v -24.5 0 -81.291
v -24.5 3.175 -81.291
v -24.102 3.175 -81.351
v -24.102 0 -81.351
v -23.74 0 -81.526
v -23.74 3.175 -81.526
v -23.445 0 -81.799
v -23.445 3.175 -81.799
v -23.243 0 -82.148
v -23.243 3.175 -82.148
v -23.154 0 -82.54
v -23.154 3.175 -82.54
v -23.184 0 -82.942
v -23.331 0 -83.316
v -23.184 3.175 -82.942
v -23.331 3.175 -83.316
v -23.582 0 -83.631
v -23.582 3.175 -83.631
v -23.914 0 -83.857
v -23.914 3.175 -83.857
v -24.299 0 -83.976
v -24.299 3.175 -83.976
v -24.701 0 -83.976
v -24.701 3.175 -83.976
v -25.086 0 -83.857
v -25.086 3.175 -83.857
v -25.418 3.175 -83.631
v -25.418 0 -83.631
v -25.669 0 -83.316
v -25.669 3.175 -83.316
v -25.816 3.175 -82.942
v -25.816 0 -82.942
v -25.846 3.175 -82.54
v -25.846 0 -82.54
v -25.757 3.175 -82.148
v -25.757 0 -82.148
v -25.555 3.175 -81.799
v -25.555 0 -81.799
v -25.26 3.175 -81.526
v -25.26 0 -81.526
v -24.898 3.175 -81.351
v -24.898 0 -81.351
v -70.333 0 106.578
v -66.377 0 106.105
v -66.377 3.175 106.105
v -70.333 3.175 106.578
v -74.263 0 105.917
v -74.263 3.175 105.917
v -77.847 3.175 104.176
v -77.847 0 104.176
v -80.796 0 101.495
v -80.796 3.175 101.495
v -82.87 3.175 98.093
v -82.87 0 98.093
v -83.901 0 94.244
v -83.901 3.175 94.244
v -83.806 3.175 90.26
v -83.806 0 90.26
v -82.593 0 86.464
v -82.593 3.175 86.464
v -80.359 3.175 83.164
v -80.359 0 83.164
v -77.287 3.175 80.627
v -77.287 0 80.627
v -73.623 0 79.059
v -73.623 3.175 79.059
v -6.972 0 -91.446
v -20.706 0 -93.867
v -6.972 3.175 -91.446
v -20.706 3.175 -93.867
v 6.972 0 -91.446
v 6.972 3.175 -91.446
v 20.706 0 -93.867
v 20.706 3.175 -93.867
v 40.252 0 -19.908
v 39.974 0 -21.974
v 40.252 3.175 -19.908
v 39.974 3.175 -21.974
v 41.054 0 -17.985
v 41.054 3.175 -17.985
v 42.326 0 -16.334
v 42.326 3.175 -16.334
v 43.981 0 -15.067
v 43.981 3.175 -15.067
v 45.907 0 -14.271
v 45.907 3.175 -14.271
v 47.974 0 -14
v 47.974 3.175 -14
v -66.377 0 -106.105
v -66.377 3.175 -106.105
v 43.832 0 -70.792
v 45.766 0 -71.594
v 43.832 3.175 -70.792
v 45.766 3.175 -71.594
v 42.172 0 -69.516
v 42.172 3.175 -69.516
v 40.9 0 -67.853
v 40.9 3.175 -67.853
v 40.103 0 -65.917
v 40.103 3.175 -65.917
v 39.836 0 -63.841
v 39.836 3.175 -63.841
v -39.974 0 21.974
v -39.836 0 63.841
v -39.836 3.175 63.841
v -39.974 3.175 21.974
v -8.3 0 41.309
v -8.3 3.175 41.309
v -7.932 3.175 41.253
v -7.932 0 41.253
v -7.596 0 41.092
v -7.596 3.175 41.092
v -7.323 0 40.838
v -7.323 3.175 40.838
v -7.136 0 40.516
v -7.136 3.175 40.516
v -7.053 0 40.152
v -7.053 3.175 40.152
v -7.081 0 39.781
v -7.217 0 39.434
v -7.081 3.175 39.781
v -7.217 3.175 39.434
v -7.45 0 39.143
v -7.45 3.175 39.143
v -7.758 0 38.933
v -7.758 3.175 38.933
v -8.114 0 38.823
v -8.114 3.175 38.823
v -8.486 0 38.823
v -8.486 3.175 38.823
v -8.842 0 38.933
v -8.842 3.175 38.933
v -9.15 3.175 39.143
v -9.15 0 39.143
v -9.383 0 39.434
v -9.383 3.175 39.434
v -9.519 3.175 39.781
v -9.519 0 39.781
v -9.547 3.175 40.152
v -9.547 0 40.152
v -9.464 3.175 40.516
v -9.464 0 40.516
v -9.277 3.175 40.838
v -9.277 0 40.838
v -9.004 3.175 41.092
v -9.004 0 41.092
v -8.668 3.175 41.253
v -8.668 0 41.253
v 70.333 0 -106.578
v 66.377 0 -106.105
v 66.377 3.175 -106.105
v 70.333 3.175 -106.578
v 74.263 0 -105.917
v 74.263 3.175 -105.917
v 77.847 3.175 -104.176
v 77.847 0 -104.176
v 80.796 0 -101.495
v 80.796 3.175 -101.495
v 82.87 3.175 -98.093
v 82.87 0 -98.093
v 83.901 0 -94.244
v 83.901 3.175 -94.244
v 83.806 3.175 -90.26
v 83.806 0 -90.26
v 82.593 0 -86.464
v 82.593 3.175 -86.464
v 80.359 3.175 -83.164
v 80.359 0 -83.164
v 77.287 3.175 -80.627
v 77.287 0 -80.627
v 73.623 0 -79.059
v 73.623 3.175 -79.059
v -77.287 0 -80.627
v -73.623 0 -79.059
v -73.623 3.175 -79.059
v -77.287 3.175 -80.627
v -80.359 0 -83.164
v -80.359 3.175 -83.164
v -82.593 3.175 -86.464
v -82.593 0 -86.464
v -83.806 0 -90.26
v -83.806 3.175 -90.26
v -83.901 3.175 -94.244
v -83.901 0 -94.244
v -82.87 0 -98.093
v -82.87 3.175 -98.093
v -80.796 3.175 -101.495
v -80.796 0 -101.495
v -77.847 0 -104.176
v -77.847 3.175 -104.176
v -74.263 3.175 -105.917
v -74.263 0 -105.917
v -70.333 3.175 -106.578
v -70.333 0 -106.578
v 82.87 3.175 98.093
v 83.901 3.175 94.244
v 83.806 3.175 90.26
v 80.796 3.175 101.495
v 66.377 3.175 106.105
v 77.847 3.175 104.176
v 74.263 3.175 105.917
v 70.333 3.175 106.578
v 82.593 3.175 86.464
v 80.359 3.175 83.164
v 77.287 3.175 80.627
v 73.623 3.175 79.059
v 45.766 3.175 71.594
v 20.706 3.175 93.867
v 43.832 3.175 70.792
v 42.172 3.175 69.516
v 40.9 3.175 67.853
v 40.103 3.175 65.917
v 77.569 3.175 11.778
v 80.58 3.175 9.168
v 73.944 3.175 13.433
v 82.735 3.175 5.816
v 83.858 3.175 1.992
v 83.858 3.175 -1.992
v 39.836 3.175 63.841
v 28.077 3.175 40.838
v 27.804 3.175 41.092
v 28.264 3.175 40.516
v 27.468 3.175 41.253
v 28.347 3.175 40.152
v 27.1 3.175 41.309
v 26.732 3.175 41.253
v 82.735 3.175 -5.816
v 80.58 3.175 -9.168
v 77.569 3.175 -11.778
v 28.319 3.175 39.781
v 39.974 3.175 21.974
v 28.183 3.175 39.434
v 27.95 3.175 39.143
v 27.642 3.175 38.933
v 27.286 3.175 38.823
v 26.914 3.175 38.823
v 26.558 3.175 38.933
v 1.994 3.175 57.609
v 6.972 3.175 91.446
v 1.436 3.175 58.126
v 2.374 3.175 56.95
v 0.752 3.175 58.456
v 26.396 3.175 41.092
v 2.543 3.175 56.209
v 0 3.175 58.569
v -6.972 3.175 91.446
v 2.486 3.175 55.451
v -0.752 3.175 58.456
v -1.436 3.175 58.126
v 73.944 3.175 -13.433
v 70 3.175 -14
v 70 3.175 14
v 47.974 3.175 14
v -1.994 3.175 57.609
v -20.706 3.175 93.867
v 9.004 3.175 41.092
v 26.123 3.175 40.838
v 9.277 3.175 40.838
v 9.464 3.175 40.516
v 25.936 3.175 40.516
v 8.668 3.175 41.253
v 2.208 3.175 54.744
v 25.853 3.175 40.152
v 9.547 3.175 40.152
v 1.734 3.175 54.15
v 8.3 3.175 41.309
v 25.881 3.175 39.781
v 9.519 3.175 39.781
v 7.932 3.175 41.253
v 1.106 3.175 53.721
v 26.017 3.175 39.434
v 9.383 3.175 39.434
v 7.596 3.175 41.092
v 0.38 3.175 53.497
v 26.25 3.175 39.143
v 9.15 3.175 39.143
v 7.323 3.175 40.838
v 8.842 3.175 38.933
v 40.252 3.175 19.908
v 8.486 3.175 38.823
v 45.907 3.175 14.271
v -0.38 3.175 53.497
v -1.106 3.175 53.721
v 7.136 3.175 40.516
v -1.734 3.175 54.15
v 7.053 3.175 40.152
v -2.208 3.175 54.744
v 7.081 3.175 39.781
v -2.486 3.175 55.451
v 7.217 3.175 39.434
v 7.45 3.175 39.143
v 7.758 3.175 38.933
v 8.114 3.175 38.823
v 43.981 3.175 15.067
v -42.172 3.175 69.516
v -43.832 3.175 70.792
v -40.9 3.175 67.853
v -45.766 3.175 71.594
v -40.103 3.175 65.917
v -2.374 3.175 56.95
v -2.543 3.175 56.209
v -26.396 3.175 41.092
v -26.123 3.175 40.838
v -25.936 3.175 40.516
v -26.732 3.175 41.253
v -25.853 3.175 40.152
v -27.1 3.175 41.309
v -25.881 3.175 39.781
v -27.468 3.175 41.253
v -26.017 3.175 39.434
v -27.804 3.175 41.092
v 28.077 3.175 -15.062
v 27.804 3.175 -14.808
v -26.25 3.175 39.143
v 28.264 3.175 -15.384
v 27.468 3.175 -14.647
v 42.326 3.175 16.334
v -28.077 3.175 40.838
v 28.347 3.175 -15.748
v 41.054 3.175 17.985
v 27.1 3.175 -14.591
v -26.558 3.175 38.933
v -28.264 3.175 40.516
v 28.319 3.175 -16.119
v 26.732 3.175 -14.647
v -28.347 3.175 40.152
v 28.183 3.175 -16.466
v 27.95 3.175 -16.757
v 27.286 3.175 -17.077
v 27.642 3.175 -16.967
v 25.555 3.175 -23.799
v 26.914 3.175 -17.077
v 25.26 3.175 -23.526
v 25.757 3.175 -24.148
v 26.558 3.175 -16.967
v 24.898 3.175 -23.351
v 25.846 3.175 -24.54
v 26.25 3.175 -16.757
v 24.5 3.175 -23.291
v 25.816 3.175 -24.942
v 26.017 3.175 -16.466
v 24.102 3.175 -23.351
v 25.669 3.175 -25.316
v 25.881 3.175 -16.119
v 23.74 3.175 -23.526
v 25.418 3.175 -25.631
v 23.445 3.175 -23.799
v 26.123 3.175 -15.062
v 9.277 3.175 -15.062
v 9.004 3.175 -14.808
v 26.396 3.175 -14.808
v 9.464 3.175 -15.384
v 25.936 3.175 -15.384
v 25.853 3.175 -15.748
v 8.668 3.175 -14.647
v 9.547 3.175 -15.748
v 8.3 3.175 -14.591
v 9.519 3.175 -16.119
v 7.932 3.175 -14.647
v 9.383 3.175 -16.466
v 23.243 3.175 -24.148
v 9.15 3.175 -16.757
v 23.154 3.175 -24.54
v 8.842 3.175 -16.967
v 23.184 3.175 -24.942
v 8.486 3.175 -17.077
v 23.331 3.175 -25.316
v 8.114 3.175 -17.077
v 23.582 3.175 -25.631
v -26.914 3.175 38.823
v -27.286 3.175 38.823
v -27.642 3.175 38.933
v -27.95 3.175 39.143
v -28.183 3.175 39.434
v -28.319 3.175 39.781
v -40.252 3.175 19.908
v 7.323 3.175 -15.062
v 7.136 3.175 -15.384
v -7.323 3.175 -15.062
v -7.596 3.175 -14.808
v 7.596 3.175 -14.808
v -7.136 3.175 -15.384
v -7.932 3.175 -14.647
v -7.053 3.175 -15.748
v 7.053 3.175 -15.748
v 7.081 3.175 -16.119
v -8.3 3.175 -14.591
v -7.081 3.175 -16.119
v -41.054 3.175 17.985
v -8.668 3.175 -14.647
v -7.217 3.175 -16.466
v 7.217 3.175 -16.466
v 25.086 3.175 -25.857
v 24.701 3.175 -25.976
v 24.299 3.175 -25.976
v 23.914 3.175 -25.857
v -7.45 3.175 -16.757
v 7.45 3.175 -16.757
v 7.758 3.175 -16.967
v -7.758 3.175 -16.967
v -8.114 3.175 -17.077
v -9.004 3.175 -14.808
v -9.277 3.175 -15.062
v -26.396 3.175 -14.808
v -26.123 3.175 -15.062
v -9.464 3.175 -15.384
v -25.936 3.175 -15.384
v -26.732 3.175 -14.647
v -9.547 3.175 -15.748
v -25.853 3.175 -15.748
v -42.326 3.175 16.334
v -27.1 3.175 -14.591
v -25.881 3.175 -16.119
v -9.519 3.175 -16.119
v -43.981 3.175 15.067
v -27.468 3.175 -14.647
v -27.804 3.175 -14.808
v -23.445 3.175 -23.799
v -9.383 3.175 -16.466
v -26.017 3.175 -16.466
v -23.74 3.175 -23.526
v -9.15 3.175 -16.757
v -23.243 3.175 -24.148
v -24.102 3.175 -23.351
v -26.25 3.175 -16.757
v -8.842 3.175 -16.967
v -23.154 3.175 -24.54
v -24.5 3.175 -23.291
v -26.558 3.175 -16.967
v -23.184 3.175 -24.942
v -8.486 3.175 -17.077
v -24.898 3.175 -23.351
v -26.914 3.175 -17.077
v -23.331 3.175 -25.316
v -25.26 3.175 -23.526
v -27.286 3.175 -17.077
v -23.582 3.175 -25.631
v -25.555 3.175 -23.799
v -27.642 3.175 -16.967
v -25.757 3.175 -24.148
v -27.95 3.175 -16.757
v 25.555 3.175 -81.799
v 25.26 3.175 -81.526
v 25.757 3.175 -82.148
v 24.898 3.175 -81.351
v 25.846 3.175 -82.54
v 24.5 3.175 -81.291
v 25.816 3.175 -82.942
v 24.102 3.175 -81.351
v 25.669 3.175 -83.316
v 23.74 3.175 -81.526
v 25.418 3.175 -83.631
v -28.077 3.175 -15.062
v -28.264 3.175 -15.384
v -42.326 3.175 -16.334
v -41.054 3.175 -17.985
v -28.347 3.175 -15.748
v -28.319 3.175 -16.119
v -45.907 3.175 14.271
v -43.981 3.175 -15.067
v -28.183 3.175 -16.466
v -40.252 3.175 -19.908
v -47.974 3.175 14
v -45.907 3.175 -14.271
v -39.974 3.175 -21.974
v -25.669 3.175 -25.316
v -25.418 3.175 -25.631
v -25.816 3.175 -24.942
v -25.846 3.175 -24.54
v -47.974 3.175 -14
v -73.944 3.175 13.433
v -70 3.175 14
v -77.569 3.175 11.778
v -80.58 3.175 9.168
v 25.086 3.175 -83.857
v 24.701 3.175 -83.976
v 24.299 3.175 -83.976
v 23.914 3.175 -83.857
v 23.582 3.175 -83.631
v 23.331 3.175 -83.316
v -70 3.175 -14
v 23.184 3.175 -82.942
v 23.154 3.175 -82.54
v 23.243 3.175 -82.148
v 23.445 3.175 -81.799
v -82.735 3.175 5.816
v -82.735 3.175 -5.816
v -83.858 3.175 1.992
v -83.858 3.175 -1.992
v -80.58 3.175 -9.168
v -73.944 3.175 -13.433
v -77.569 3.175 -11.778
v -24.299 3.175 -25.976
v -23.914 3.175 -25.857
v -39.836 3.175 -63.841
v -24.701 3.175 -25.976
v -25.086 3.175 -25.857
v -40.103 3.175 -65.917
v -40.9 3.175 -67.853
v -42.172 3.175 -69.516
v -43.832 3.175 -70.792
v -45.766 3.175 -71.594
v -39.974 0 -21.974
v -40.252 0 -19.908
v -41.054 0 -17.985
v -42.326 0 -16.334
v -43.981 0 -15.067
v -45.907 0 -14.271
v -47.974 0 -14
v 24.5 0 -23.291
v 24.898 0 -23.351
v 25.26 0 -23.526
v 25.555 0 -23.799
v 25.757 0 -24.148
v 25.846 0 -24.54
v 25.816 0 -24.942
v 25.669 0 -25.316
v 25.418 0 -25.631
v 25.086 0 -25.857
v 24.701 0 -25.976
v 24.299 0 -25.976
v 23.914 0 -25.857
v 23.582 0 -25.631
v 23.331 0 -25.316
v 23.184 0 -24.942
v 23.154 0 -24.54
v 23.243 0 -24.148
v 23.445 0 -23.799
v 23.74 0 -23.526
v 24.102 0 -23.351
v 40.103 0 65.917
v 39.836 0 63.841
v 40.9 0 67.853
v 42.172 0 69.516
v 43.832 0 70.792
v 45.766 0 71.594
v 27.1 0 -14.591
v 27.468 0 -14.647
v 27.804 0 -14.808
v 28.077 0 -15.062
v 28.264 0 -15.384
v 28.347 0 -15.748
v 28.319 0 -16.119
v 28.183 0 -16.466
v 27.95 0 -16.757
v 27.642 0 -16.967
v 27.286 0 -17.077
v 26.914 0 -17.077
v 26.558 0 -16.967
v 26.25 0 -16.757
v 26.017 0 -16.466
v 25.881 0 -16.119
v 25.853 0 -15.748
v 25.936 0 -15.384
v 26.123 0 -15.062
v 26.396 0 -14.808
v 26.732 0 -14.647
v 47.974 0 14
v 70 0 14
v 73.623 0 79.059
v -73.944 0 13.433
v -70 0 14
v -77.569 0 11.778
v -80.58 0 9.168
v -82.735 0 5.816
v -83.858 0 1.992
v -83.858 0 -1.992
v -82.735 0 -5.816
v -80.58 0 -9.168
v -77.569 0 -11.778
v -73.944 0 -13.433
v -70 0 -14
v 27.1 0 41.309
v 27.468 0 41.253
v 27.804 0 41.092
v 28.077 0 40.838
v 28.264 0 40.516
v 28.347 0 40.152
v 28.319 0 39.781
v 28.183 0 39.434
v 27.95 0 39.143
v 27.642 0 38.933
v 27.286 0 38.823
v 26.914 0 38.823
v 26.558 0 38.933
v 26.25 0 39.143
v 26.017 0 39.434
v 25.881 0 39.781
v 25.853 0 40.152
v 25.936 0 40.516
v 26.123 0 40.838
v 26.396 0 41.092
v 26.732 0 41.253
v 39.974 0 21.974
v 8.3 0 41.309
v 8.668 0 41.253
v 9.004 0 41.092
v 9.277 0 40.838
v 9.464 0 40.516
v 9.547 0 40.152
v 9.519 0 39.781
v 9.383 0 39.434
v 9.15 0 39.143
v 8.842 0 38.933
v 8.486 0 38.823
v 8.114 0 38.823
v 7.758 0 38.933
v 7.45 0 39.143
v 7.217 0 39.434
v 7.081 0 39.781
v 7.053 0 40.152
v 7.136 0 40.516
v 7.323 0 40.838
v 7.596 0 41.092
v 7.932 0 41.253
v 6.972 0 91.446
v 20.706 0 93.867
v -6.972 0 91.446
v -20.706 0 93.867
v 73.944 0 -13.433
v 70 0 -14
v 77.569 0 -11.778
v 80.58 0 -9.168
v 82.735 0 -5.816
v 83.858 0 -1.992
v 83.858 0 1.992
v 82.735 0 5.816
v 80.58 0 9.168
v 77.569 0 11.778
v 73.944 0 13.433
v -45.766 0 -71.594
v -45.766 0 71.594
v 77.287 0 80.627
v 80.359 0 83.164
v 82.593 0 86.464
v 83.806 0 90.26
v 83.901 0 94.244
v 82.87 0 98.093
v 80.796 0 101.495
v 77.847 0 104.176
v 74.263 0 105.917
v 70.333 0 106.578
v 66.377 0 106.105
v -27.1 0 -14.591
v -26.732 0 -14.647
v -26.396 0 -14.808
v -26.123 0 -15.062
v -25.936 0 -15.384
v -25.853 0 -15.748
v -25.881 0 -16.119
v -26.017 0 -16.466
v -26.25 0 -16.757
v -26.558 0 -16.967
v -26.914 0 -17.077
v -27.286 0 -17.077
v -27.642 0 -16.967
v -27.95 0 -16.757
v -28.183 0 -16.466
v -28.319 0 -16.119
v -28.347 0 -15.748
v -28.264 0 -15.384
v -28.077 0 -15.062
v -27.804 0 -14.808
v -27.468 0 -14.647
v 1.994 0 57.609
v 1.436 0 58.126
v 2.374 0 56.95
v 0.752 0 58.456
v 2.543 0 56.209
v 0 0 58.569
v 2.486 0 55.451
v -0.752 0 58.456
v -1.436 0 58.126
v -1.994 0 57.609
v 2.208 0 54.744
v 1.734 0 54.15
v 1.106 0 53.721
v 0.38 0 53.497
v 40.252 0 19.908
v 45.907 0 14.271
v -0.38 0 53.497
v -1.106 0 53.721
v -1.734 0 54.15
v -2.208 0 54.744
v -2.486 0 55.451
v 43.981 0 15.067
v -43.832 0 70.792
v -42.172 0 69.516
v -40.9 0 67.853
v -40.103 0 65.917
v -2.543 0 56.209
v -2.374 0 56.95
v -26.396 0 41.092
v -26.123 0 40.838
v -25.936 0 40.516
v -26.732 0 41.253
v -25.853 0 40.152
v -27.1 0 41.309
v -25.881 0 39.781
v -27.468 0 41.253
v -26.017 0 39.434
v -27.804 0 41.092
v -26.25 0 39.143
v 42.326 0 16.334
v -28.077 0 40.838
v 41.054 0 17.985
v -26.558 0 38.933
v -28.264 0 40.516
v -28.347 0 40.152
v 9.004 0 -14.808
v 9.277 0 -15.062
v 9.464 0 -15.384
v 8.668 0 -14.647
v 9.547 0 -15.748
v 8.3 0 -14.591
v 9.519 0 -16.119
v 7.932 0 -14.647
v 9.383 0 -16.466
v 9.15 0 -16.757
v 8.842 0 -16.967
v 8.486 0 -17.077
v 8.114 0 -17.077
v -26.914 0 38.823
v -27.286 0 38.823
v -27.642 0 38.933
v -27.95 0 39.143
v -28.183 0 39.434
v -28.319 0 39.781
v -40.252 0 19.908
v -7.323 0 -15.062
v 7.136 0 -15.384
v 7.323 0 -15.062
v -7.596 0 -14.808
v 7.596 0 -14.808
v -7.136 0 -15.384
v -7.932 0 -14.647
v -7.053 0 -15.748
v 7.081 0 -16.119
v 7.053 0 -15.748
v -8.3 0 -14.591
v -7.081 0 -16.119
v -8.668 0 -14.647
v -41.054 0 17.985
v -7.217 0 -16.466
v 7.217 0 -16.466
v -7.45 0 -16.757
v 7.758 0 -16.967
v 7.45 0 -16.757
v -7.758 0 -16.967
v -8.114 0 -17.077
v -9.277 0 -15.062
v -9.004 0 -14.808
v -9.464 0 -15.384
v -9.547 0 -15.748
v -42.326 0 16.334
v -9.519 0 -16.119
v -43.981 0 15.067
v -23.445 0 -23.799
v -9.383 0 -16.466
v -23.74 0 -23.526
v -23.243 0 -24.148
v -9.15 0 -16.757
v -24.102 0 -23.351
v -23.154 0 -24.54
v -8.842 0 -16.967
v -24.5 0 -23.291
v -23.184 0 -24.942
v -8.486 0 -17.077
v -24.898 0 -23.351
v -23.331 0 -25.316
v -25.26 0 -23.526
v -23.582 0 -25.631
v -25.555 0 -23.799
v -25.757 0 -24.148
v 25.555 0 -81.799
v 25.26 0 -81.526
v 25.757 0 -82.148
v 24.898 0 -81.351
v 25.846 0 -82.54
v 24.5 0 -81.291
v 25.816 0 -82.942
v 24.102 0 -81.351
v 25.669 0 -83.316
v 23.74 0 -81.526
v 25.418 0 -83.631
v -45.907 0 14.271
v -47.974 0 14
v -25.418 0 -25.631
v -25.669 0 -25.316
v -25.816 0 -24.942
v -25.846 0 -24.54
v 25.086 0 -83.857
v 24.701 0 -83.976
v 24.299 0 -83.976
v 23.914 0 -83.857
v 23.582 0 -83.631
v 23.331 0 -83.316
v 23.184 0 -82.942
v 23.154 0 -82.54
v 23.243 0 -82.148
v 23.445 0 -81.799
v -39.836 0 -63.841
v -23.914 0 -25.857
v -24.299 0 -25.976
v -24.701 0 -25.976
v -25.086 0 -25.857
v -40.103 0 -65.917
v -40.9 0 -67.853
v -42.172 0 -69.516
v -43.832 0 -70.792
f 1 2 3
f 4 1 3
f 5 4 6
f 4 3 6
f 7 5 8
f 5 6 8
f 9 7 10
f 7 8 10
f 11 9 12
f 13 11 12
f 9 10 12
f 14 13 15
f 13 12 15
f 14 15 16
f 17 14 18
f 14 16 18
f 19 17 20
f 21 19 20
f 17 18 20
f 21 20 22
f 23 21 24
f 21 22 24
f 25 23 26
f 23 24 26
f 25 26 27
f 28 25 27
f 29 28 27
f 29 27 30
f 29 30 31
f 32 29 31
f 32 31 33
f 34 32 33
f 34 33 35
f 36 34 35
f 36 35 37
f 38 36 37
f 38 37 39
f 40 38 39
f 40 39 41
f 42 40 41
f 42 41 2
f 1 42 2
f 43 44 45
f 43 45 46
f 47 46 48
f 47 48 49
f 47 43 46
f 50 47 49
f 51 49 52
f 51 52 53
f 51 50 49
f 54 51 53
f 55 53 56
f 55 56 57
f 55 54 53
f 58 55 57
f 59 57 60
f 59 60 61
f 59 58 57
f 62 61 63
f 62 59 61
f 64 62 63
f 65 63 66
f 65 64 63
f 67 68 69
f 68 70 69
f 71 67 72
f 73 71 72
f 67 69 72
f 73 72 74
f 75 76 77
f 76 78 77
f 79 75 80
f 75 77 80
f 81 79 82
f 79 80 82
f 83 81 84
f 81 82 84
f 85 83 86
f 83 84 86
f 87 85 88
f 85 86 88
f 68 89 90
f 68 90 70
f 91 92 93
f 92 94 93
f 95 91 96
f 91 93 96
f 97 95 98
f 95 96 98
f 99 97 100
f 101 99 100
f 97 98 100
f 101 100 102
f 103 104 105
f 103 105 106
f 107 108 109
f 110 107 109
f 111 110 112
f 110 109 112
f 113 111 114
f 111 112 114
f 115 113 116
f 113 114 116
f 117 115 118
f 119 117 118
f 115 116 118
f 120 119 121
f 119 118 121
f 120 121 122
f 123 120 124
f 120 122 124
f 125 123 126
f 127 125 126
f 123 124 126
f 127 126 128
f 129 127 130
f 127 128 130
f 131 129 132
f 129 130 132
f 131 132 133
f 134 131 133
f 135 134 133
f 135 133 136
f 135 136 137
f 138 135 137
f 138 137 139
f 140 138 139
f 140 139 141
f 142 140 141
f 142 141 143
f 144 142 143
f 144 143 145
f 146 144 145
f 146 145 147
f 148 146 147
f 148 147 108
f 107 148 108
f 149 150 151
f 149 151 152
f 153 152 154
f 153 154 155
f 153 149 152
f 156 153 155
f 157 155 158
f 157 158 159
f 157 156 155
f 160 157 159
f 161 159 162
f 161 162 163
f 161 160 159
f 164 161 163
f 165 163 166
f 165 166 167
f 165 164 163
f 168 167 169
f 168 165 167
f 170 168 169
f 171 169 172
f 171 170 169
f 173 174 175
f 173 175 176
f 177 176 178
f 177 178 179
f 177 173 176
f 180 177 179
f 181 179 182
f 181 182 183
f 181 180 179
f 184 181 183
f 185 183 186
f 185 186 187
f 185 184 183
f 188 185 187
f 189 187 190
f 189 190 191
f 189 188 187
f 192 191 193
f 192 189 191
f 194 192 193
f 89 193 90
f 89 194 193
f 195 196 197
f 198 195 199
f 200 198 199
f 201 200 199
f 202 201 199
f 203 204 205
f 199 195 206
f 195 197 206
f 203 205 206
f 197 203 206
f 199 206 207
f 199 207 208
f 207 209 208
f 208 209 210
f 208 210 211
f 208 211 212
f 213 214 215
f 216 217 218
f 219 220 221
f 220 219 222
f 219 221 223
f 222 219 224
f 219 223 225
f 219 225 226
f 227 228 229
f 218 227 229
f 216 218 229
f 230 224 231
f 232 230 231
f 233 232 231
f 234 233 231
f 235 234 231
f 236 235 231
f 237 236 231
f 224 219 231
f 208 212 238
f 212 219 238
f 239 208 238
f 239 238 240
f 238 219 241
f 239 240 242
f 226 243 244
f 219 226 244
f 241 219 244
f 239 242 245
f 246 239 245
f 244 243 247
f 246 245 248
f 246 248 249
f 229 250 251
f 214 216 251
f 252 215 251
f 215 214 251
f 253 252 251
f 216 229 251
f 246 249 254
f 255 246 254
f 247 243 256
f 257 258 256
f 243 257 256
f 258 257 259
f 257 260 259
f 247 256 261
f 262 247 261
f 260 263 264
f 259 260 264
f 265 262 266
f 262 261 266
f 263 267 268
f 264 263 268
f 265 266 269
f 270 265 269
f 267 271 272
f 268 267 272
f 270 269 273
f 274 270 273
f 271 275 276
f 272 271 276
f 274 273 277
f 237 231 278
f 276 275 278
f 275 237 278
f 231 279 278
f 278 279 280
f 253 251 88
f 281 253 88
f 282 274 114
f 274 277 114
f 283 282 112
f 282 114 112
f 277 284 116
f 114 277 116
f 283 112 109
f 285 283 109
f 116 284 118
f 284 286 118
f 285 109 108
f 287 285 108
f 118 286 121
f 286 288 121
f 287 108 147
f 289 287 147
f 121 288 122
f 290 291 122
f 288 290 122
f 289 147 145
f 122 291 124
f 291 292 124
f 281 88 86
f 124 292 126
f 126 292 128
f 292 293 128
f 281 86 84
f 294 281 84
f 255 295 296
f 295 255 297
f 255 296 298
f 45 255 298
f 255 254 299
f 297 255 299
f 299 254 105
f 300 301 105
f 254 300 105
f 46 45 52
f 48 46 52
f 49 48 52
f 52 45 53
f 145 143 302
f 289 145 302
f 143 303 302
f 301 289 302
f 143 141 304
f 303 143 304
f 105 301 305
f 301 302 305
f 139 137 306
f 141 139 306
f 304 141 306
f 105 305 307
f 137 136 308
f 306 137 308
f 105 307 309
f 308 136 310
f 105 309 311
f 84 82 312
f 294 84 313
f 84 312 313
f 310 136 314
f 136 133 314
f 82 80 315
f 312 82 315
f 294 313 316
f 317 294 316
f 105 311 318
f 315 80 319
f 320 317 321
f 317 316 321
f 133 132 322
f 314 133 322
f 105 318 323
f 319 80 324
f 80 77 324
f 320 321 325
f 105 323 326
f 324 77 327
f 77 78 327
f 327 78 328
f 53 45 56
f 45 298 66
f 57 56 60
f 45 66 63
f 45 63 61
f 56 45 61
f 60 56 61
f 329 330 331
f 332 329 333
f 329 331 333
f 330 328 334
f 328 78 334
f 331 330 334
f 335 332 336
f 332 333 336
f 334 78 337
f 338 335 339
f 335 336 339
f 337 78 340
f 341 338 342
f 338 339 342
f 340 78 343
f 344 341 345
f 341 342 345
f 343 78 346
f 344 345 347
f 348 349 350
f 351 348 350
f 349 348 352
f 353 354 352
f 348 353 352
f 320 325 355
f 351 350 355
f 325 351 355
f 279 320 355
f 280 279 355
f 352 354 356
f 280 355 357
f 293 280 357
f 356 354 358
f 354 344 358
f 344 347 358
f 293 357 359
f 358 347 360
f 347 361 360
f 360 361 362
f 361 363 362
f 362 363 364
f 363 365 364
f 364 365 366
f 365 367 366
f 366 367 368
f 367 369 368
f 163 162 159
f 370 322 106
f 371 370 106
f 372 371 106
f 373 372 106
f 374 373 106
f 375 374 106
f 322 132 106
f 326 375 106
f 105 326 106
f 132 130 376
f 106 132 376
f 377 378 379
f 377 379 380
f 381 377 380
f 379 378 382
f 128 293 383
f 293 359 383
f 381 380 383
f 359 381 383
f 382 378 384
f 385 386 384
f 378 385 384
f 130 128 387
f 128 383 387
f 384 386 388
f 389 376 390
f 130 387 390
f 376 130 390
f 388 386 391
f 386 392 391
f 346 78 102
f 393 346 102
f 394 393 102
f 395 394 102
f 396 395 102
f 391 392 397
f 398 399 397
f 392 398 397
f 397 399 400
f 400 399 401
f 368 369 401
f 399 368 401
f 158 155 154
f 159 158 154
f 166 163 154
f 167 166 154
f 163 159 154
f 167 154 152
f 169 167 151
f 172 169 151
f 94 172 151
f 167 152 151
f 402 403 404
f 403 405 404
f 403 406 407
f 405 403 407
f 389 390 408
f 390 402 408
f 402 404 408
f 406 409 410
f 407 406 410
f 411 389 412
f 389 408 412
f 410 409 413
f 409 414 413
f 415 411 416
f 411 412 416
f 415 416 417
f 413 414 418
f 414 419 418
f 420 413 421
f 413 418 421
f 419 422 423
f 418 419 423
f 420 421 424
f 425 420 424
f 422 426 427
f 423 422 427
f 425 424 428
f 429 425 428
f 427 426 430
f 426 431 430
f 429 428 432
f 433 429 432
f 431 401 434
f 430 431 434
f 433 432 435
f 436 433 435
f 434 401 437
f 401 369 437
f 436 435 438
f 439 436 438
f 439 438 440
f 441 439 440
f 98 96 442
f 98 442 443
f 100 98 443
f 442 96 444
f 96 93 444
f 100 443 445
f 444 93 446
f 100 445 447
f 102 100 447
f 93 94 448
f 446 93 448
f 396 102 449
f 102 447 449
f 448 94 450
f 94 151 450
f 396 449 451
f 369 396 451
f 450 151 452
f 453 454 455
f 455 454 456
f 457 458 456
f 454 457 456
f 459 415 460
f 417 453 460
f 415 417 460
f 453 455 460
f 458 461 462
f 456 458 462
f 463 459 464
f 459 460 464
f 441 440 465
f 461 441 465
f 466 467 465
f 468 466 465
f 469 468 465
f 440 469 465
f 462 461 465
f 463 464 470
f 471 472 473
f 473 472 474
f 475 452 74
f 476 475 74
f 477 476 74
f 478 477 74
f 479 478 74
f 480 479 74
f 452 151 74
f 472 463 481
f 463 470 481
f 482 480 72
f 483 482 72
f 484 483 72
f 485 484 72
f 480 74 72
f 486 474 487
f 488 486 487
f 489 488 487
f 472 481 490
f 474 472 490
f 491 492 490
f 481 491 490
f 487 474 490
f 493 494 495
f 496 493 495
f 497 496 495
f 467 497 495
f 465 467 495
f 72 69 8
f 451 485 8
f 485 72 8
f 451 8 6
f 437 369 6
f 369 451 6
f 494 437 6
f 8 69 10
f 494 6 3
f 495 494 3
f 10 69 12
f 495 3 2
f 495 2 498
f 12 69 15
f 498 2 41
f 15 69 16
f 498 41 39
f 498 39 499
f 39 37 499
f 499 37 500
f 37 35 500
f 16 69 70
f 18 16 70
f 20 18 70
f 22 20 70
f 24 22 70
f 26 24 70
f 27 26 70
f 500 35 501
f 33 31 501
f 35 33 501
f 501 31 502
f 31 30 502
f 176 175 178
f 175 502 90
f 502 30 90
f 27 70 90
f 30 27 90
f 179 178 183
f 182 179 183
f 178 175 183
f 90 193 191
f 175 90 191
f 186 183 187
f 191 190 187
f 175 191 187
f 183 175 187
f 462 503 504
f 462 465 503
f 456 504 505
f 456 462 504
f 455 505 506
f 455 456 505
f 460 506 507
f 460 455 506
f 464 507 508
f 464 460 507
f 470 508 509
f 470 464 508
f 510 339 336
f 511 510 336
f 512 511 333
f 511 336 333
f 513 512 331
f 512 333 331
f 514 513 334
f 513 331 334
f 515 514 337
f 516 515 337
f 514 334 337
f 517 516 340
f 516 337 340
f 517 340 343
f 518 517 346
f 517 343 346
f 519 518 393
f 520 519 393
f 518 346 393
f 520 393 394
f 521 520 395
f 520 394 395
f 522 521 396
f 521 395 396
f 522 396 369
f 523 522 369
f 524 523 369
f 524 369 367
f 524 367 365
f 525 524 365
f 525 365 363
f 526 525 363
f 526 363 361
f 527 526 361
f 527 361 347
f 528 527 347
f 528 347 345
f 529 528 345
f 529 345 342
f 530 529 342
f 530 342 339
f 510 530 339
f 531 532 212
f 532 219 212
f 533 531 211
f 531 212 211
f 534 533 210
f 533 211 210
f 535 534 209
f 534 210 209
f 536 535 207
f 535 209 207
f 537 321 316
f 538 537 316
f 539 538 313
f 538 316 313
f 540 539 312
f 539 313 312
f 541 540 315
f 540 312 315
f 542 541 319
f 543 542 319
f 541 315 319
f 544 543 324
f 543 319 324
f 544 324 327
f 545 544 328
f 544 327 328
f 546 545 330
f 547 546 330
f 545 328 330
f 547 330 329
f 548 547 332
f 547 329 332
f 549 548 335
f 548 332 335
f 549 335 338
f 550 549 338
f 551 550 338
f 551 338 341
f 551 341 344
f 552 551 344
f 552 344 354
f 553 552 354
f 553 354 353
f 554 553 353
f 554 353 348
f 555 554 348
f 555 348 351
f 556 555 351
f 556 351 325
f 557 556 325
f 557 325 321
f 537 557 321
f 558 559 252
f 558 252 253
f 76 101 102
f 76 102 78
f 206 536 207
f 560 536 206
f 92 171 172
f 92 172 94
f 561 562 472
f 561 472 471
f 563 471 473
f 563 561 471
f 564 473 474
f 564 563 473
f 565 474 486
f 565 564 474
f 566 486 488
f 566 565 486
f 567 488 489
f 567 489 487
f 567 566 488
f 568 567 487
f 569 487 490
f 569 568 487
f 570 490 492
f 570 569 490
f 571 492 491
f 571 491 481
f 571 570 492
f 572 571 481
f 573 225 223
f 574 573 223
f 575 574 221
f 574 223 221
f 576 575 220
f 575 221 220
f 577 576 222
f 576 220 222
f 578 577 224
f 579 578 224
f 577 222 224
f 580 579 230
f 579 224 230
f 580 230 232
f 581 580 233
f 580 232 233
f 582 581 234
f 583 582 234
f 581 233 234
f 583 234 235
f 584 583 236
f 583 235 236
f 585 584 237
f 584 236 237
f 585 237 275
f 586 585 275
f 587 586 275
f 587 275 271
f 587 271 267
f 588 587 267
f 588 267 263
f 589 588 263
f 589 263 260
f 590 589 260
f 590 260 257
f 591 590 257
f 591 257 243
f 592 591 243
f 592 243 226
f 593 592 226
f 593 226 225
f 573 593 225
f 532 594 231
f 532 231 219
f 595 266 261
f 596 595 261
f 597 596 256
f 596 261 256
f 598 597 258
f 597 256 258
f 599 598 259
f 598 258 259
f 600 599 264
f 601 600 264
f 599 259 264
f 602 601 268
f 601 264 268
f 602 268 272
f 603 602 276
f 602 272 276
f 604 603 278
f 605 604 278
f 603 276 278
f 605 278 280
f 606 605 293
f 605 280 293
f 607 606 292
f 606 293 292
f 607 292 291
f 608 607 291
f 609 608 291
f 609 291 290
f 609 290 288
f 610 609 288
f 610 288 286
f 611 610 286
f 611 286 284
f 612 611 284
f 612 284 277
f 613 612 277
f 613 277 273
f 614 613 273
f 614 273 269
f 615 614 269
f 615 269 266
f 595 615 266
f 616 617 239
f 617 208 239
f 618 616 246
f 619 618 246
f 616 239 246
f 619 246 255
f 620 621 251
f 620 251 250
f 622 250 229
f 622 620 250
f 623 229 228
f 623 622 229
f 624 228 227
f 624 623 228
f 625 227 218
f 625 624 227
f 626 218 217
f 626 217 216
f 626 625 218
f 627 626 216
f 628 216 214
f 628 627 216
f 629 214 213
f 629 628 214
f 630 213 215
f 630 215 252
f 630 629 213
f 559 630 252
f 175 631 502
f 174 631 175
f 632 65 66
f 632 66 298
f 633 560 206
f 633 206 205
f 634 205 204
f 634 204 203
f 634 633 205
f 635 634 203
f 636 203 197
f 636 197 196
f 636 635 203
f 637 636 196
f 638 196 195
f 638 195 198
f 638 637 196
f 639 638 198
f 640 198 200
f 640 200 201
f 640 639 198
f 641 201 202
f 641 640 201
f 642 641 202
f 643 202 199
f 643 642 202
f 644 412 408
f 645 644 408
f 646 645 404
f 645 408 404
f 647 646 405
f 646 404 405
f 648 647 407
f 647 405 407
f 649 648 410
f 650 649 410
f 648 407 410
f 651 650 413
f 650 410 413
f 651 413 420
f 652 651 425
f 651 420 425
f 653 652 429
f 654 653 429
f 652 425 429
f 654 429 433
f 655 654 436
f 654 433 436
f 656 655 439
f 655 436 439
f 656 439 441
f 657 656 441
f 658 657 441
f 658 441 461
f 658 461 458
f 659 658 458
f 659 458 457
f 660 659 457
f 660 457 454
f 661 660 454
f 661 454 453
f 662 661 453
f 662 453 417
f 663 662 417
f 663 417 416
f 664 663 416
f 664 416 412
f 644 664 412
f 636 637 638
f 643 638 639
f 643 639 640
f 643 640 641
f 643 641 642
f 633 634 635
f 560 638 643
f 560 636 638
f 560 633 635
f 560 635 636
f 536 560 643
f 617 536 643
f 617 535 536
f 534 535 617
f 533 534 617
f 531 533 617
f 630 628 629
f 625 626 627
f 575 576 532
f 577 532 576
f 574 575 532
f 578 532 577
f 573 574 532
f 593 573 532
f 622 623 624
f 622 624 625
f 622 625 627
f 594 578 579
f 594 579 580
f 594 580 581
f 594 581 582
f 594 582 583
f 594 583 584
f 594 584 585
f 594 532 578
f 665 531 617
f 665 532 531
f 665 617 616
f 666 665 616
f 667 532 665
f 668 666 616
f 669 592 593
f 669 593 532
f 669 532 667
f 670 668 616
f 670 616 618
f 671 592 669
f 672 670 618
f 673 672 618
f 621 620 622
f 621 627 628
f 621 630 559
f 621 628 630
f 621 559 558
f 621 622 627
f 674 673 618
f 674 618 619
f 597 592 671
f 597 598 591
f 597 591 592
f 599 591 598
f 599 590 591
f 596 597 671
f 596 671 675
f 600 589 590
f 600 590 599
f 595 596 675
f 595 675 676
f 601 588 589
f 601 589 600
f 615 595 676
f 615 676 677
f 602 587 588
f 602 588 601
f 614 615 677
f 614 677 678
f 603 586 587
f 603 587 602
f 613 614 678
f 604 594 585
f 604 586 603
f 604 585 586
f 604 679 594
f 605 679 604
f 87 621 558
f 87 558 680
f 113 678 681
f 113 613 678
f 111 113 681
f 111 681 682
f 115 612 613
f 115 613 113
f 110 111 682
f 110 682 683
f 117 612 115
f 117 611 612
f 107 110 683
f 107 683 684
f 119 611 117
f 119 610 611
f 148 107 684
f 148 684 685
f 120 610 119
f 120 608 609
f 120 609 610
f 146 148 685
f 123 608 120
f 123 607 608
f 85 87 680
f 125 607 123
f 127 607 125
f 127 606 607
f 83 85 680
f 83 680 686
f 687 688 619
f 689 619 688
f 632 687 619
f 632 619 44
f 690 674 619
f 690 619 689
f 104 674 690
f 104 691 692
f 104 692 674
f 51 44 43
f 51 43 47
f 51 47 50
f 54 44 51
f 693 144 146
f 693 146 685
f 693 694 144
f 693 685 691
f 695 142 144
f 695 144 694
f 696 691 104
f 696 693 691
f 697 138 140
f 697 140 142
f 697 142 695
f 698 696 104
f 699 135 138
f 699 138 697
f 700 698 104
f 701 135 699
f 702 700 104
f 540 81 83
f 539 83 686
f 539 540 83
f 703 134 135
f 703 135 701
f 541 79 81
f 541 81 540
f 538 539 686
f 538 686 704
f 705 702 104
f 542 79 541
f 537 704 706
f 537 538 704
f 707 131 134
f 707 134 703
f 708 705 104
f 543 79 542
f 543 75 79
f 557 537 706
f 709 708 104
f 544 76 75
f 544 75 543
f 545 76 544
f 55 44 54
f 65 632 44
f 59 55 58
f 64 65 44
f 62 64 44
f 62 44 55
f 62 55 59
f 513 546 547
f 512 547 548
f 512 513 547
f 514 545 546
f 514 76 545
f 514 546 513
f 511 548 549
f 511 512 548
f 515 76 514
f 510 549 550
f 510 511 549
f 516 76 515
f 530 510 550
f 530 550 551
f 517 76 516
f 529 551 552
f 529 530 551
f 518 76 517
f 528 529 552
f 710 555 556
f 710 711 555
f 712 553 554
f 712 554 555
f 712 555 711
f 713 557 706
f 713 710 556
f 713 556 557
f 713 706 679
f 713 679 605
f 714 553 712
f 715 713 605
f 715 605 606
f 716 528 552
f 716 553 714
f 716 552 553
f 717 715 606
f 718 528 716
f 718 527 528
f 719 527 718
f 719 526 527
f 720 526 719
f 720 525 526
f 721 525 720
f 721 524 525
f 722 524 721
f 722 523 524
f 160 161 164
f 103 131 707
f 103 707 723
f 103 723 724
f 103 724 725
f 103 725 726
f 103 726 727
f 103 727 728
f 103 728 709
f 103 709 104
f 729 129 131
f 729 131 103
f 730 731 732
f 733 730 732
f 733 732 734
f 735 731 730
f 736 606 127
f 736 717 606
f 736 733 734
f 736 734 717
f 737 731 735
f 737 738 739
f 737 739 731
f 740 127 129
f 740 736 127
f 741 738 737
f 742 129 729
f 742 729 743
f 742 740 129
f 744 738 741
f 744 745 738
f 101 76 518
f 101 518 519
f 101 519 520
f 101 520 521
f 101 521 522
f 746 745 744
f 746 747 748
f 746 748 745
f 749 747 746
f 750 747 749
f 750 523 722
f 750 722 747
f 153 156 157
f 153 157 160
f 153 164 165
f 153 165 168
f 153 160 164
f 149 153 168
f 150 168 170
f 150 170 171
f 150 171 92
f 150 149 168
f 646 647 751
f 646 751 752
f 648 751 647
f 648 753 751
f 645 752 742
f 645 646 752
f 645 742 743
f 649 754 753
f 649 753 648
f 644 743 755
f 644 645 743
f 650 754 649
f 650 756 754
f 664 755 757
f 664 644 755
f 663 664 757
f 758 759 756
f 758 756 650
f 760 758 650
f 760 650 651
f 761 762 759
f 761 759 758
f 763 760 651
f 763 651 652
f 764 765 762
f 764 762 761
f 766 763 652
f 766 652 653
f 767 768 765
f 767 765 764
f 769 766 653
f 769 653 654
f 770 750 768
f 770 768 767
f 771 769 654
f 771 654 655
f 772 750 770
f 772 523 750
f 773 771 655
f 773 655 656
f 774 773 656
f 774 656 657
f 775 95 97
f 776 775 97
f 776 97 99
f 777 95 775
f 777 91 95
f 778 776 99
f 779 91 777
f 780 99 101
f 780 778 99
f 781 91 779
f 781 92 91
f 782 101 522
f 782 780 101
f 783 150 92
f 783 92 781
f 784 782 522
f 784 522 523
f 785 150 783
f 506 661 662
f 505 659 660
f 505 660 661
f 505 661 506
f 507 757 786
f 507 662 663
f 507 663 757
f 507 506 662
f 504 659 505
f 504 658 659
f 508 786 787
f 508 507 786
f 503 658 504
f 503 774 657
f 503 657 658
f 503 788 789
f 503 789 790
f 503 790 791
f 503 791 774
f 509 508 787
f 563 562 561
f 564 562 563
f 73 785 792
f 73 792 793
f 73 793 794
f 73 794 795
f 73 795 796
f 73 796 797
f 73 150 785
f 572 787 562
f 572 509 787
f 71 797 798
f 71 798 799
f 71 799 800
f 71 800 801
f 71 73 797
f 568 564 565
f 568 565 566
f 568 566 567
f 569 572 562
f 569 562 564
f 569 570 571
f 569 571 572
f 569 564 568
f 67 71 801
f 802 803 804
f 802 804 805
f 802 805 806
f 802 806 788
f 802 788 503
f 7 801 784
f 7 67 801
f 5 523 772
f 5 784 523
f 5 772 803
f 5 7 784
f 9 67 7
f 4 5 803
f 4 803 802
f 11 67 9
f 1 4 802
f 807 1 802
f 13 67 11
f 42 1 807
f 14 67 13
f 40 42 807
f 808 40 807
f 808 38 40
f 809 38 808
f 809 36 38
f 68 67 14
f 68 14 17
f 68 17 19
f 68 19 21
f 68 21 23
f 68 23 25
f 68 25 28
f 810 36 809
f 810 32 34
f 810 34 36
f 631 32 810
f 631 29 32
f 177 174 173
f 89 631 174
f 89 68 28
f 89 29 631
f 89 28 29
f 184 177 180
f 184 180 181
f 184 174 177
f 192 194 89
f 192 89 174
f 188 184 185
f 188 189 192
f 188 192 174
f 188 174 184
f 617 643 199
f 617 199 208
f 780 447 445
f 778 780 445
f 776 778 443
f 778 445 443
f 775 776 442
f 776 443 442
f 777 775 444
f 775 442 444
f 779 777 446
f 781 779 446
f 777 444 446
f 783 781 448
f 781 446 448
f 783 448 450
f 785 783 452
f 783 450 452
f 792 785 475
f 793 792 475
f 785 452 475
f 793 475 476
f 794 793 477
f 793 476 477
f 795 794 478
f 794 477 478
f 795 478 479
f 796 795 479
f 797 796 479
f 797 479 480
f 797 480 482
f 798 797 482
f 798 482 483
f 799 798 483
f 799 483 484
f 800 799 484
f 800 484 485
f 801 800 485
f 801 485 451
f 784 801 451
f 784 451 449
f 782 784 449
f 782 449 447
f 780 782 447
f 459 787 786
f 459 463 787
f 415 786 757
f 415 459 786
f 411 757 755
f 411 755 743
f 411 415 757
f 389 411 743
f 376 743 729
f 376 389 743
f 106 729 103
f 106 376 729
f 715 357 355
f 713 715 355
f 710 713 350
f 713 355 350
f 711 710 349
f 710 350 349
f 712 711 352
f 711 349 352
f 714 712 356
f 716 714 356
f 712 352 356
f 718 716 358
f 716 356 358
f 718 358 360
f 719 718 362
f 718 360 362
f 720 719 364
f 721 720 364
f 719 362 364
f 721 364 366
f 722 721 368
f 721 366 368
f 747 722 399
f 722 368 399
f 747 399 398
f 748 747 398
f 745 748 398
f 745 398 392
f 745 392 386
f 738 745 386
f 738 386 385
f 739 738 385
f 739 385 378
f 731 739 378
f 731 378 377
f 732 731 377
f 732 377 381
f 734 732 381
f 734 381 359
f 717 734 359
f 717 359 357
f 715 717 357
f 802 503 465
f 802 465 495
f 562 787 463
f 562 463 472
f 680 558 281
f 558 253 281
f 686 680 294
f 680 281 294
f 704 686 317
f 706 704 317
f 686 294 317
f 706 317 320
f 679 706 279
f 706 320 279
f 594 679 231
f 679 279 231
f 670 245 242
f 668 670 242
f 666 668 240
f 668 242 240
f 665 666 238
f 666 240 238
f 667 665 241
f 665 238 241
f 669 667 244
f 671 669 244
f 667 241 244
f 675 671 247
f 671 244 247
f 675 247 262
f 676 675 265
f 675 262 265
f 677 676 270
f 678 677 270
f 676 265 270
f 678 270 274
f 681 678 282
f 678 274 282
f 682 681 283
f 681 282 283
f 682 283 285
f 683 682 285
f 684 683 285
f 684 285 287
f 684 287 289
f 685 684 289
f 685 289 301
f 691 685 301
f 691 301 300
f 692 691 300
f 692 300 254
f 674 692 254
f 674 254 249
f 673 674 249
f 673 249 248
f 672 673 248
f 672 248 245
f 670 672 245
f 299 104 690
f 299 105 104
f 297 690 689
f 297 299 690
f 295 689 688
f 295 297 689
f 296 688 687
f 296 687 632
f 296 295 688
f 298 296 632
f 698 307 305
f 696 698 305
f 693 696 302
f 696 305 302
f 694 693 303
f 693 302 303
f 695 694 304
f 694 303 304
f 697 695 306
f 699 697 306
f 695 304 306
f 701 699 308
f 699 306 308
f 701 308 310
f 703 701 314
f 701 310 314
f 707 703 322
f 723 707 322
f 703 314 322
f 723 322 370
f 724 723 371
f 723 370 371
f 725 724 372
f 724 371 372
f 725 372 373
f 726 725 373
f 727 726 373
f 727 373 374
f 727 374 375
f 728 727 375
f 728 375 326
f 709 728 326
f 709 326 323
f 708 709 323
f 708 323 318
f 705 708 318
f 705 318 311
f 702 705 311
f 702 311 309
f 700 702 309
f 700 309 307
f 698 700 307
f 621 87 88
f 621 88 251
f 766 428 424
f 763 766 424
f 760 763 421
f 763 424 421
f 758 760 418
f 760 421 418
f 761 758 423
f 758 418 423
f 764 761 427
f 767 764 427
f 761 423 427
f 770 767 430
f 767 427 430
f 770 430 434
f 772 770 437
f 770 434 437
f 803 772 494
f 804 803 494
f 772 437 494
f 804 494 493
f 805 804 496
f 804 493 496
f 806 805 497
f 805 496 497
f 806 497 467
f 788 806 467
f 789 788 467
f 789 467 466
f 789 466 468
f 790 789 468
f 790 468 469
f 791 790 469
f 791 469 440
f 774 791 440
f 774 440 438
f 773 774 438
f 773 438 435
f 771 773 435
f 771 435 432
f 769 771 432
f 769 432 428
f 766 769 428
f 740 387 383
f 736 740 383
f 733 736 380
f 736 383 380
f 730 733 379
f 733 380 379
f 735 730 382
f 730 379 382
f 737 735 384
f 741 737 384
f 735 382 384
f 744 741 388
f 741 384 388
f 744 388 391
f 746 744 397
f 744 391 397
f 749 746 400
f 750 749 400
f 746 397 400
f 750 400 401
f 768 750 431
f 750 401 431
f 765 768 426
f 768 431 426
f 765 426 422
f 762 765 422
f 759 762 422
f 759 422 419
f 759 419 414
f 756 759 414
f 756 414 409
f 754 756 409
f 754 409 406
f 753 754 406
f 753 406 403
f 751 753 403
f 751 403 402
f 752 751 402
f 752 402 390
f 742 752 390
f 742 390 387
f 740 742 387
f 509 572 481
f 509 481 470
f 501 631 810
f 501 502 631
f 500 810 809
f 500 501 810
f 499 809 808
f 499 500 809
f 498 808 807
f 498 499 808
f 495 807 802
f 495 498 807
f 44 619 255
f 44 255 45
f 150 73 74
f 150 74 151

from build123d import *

# Parameters (mm, degrees)
BOSS_EXTRUDE1_DEPTH = 3.175
FILLET1_R           = 80
FILLET2_R           = 8
SKETCH2_R           = 1.35
CUT_EXTRUDE1_DEPTH  = 136.741386774
SKETCH3_R           = 1.25
CUT_EXTRUDE2_DEPTH  = 136.741386774
SKETCH5_R           = 2.55
CUT_EXTRUDE3_DEPTH  = 136.741386774


with BuildPart() as part:
    # Sketch1 → Boss-Extrude1 (new body)
    with BuildSketch(Plane(origin=(0, 0, 0), x_dir=(1, 0, 0), z_dir=(0, 1, 0))):
        with BuildLine():
            Line((-70, 14), (-40, 14))
            Line((-40, 14), (-39.816062711, 70))
            Line((-39.816062711, 70), (-73.623466631, 79.058666579))
            ThreePointArc((-73.623466631, 79.058666579), (-83.522961568, 96.205094778), (-66.376533369, 106.104589715))
            Line((-66.376533369, 106.104589715), (0, 88.319051202))
            Line((0, 88.319051202), (66.376533369, 106.104589715))
            ThreePointArc((66.376533369, 106.104589715), (83.522961568, 96.205094778), (73.623466631, 79.058666579))
            Line((73.623466631, 79.058666579), (39.816062711, 70))
            Line((39.816062711, 70), (40, 14))
            Line((40, 14), (70, 14))
            ThreePointArc((70, 14), (84, 0), (70, -14))
            Line((70, -14), (40, -14))
            Line((40, -14), (39.816062711, -70))
            Line((39.816062711, -70), (73.623466631, -79.058666579))
            ThreePointArc((73.623466631, -79.058666579), (83.522961568, -96.205094778), (66.376533369, -106.104589715))
            Line((66.376533369, -106.104589715), (0, -88.319051202))
            Line((0, -88.319051202), (-66.376533369, -106.104589715))
            ThreePointArc((-66.376533369, -106.104589715), (-83.522961568, -96.205094778), (-73.623466631, -79.058666579))
            Line((-73.623466631, -79.058666579), (-39.816062711, -70))
            Line((-39.816062711, -70), (-40, -14))
            Line((-40, -14), (-70, -14))
            ThreePointArc((-70, -14), (-84, 0), (-70, 14))
        make_face()
    extrude(amount=BOSS_EXTRUDE1_DEPTH)

    # Fillet1
    fillet1_edges = [part.edges().sort_by_distance(p)[0] for p in [
        (0, 1.5875, -88.319051202),
        (0, 1.5875, 88.319051202),
    ]]
    fillet(fillet1_edges, radius=FILLET1_R)

    # Fillet2
    fillet2_edges = [part.edges().sort_by_distance(p)[0] for p in [
        (-40, 1.5875, -14),
        (-39.816062711, 1.5875, -70),
        (39.816062711, 1.5875, -70),
        (40, 1.5875, -14),
        (40, 1.5875, 14),
        (39.816062711, 1.5875, 70),
        (-39.816062711, 1.5875, 70),
        (-40, 1.5875, 14),
    ]]
    fillet(fillet2_edges, radius=FILLET2_R)

    # Sketch2 → Cut-Extrude1 (cut, through all)
    with BuildSketch(Plane(origin=(0, 3.175, 0), x_dir=(1, 0, 0), z_dir=(0, 1, 0))):
        with Locations(Location((-24.5, 24.641145635, 0), (0, 0, 270))):
            Circle(SKETCH2_R)
        with Locations(Location((24.5, 24.641145635, 0), (0, 0, 270))):
            Circle(SKETCH2_R)
        with Locations(Location((24.5, 82.641145635, 0), (0, 0, 270))):
            Circle(SKETCH2_R)
        with Locations(Location((-24.5, 82.641145635, 0), (0, 0, 270))):
            Circle(SKETCH2_R)
    extrude(amount=-CUT_EXTRUDE1_DEPTH, mode=Mode.SUBTRACT)

    # Sketch3 → Cut-Extrude2 (cut, through all)
    with BuildSketch(Plane(origin=(0, 3.175, 0), x_dir=(1, 0, 0), z_dir=(0, 1, 0))):
        with Locations(Location((-8.3, -40.058854365, 0), (0, 0, 270))):
            Circle(SKETCH3_R)
        with Locations(Location((-27.1, -40.058854365, 0), (0, 0, 270))):
            Circle(SKETCH3_R)
        with Locations(Location((-27.1, 15.841145635, 0), (0, 0, 270))):
            Circle(SKETCH3_R)
        with Locations(Location((-8.3, 15.841145635, 0), (0, 0, 270))):
            Circle(SKETCH3_R)
        with Locations(Location((8.3, 15.841145635, 0), (0, 0, 270))):
            Circle(SKETCH3_R)
        with Locations(Location((27.1, 15.841145635, 0), (0, 0, 270))):
            Circle(SKETCH3_R)
        with Locations(Location((8.3, -40.058854365, 0), (0, 0, 270))):
            Circle(SKETCH3_R)
        with Locations(Location((27.1, -40.058854365, 0), (0, 0, 270))):
            Circle(SKETCH3_R)
    extrude(amount=-CUT_EXTRUDE2_DEPTH, mode=Mode.SUBTRACT)

    # Sketch5 → Cut-Extrude3 (cut, through all)
    with BuildSketch(Plane(origin=(0, 3.175, 0), x_dir=(1, 0, 0), z_dir=(0, 1, 0))):
        with Locations(Location((0, -56.018854365, 0), (0, 0, 270))):
            Circle(SKETCH5_R)
    extrude(amount=-CUT_EXTRUDE3_DEPTH, mode=Mode.SUBTRACT)


solid = part.part
